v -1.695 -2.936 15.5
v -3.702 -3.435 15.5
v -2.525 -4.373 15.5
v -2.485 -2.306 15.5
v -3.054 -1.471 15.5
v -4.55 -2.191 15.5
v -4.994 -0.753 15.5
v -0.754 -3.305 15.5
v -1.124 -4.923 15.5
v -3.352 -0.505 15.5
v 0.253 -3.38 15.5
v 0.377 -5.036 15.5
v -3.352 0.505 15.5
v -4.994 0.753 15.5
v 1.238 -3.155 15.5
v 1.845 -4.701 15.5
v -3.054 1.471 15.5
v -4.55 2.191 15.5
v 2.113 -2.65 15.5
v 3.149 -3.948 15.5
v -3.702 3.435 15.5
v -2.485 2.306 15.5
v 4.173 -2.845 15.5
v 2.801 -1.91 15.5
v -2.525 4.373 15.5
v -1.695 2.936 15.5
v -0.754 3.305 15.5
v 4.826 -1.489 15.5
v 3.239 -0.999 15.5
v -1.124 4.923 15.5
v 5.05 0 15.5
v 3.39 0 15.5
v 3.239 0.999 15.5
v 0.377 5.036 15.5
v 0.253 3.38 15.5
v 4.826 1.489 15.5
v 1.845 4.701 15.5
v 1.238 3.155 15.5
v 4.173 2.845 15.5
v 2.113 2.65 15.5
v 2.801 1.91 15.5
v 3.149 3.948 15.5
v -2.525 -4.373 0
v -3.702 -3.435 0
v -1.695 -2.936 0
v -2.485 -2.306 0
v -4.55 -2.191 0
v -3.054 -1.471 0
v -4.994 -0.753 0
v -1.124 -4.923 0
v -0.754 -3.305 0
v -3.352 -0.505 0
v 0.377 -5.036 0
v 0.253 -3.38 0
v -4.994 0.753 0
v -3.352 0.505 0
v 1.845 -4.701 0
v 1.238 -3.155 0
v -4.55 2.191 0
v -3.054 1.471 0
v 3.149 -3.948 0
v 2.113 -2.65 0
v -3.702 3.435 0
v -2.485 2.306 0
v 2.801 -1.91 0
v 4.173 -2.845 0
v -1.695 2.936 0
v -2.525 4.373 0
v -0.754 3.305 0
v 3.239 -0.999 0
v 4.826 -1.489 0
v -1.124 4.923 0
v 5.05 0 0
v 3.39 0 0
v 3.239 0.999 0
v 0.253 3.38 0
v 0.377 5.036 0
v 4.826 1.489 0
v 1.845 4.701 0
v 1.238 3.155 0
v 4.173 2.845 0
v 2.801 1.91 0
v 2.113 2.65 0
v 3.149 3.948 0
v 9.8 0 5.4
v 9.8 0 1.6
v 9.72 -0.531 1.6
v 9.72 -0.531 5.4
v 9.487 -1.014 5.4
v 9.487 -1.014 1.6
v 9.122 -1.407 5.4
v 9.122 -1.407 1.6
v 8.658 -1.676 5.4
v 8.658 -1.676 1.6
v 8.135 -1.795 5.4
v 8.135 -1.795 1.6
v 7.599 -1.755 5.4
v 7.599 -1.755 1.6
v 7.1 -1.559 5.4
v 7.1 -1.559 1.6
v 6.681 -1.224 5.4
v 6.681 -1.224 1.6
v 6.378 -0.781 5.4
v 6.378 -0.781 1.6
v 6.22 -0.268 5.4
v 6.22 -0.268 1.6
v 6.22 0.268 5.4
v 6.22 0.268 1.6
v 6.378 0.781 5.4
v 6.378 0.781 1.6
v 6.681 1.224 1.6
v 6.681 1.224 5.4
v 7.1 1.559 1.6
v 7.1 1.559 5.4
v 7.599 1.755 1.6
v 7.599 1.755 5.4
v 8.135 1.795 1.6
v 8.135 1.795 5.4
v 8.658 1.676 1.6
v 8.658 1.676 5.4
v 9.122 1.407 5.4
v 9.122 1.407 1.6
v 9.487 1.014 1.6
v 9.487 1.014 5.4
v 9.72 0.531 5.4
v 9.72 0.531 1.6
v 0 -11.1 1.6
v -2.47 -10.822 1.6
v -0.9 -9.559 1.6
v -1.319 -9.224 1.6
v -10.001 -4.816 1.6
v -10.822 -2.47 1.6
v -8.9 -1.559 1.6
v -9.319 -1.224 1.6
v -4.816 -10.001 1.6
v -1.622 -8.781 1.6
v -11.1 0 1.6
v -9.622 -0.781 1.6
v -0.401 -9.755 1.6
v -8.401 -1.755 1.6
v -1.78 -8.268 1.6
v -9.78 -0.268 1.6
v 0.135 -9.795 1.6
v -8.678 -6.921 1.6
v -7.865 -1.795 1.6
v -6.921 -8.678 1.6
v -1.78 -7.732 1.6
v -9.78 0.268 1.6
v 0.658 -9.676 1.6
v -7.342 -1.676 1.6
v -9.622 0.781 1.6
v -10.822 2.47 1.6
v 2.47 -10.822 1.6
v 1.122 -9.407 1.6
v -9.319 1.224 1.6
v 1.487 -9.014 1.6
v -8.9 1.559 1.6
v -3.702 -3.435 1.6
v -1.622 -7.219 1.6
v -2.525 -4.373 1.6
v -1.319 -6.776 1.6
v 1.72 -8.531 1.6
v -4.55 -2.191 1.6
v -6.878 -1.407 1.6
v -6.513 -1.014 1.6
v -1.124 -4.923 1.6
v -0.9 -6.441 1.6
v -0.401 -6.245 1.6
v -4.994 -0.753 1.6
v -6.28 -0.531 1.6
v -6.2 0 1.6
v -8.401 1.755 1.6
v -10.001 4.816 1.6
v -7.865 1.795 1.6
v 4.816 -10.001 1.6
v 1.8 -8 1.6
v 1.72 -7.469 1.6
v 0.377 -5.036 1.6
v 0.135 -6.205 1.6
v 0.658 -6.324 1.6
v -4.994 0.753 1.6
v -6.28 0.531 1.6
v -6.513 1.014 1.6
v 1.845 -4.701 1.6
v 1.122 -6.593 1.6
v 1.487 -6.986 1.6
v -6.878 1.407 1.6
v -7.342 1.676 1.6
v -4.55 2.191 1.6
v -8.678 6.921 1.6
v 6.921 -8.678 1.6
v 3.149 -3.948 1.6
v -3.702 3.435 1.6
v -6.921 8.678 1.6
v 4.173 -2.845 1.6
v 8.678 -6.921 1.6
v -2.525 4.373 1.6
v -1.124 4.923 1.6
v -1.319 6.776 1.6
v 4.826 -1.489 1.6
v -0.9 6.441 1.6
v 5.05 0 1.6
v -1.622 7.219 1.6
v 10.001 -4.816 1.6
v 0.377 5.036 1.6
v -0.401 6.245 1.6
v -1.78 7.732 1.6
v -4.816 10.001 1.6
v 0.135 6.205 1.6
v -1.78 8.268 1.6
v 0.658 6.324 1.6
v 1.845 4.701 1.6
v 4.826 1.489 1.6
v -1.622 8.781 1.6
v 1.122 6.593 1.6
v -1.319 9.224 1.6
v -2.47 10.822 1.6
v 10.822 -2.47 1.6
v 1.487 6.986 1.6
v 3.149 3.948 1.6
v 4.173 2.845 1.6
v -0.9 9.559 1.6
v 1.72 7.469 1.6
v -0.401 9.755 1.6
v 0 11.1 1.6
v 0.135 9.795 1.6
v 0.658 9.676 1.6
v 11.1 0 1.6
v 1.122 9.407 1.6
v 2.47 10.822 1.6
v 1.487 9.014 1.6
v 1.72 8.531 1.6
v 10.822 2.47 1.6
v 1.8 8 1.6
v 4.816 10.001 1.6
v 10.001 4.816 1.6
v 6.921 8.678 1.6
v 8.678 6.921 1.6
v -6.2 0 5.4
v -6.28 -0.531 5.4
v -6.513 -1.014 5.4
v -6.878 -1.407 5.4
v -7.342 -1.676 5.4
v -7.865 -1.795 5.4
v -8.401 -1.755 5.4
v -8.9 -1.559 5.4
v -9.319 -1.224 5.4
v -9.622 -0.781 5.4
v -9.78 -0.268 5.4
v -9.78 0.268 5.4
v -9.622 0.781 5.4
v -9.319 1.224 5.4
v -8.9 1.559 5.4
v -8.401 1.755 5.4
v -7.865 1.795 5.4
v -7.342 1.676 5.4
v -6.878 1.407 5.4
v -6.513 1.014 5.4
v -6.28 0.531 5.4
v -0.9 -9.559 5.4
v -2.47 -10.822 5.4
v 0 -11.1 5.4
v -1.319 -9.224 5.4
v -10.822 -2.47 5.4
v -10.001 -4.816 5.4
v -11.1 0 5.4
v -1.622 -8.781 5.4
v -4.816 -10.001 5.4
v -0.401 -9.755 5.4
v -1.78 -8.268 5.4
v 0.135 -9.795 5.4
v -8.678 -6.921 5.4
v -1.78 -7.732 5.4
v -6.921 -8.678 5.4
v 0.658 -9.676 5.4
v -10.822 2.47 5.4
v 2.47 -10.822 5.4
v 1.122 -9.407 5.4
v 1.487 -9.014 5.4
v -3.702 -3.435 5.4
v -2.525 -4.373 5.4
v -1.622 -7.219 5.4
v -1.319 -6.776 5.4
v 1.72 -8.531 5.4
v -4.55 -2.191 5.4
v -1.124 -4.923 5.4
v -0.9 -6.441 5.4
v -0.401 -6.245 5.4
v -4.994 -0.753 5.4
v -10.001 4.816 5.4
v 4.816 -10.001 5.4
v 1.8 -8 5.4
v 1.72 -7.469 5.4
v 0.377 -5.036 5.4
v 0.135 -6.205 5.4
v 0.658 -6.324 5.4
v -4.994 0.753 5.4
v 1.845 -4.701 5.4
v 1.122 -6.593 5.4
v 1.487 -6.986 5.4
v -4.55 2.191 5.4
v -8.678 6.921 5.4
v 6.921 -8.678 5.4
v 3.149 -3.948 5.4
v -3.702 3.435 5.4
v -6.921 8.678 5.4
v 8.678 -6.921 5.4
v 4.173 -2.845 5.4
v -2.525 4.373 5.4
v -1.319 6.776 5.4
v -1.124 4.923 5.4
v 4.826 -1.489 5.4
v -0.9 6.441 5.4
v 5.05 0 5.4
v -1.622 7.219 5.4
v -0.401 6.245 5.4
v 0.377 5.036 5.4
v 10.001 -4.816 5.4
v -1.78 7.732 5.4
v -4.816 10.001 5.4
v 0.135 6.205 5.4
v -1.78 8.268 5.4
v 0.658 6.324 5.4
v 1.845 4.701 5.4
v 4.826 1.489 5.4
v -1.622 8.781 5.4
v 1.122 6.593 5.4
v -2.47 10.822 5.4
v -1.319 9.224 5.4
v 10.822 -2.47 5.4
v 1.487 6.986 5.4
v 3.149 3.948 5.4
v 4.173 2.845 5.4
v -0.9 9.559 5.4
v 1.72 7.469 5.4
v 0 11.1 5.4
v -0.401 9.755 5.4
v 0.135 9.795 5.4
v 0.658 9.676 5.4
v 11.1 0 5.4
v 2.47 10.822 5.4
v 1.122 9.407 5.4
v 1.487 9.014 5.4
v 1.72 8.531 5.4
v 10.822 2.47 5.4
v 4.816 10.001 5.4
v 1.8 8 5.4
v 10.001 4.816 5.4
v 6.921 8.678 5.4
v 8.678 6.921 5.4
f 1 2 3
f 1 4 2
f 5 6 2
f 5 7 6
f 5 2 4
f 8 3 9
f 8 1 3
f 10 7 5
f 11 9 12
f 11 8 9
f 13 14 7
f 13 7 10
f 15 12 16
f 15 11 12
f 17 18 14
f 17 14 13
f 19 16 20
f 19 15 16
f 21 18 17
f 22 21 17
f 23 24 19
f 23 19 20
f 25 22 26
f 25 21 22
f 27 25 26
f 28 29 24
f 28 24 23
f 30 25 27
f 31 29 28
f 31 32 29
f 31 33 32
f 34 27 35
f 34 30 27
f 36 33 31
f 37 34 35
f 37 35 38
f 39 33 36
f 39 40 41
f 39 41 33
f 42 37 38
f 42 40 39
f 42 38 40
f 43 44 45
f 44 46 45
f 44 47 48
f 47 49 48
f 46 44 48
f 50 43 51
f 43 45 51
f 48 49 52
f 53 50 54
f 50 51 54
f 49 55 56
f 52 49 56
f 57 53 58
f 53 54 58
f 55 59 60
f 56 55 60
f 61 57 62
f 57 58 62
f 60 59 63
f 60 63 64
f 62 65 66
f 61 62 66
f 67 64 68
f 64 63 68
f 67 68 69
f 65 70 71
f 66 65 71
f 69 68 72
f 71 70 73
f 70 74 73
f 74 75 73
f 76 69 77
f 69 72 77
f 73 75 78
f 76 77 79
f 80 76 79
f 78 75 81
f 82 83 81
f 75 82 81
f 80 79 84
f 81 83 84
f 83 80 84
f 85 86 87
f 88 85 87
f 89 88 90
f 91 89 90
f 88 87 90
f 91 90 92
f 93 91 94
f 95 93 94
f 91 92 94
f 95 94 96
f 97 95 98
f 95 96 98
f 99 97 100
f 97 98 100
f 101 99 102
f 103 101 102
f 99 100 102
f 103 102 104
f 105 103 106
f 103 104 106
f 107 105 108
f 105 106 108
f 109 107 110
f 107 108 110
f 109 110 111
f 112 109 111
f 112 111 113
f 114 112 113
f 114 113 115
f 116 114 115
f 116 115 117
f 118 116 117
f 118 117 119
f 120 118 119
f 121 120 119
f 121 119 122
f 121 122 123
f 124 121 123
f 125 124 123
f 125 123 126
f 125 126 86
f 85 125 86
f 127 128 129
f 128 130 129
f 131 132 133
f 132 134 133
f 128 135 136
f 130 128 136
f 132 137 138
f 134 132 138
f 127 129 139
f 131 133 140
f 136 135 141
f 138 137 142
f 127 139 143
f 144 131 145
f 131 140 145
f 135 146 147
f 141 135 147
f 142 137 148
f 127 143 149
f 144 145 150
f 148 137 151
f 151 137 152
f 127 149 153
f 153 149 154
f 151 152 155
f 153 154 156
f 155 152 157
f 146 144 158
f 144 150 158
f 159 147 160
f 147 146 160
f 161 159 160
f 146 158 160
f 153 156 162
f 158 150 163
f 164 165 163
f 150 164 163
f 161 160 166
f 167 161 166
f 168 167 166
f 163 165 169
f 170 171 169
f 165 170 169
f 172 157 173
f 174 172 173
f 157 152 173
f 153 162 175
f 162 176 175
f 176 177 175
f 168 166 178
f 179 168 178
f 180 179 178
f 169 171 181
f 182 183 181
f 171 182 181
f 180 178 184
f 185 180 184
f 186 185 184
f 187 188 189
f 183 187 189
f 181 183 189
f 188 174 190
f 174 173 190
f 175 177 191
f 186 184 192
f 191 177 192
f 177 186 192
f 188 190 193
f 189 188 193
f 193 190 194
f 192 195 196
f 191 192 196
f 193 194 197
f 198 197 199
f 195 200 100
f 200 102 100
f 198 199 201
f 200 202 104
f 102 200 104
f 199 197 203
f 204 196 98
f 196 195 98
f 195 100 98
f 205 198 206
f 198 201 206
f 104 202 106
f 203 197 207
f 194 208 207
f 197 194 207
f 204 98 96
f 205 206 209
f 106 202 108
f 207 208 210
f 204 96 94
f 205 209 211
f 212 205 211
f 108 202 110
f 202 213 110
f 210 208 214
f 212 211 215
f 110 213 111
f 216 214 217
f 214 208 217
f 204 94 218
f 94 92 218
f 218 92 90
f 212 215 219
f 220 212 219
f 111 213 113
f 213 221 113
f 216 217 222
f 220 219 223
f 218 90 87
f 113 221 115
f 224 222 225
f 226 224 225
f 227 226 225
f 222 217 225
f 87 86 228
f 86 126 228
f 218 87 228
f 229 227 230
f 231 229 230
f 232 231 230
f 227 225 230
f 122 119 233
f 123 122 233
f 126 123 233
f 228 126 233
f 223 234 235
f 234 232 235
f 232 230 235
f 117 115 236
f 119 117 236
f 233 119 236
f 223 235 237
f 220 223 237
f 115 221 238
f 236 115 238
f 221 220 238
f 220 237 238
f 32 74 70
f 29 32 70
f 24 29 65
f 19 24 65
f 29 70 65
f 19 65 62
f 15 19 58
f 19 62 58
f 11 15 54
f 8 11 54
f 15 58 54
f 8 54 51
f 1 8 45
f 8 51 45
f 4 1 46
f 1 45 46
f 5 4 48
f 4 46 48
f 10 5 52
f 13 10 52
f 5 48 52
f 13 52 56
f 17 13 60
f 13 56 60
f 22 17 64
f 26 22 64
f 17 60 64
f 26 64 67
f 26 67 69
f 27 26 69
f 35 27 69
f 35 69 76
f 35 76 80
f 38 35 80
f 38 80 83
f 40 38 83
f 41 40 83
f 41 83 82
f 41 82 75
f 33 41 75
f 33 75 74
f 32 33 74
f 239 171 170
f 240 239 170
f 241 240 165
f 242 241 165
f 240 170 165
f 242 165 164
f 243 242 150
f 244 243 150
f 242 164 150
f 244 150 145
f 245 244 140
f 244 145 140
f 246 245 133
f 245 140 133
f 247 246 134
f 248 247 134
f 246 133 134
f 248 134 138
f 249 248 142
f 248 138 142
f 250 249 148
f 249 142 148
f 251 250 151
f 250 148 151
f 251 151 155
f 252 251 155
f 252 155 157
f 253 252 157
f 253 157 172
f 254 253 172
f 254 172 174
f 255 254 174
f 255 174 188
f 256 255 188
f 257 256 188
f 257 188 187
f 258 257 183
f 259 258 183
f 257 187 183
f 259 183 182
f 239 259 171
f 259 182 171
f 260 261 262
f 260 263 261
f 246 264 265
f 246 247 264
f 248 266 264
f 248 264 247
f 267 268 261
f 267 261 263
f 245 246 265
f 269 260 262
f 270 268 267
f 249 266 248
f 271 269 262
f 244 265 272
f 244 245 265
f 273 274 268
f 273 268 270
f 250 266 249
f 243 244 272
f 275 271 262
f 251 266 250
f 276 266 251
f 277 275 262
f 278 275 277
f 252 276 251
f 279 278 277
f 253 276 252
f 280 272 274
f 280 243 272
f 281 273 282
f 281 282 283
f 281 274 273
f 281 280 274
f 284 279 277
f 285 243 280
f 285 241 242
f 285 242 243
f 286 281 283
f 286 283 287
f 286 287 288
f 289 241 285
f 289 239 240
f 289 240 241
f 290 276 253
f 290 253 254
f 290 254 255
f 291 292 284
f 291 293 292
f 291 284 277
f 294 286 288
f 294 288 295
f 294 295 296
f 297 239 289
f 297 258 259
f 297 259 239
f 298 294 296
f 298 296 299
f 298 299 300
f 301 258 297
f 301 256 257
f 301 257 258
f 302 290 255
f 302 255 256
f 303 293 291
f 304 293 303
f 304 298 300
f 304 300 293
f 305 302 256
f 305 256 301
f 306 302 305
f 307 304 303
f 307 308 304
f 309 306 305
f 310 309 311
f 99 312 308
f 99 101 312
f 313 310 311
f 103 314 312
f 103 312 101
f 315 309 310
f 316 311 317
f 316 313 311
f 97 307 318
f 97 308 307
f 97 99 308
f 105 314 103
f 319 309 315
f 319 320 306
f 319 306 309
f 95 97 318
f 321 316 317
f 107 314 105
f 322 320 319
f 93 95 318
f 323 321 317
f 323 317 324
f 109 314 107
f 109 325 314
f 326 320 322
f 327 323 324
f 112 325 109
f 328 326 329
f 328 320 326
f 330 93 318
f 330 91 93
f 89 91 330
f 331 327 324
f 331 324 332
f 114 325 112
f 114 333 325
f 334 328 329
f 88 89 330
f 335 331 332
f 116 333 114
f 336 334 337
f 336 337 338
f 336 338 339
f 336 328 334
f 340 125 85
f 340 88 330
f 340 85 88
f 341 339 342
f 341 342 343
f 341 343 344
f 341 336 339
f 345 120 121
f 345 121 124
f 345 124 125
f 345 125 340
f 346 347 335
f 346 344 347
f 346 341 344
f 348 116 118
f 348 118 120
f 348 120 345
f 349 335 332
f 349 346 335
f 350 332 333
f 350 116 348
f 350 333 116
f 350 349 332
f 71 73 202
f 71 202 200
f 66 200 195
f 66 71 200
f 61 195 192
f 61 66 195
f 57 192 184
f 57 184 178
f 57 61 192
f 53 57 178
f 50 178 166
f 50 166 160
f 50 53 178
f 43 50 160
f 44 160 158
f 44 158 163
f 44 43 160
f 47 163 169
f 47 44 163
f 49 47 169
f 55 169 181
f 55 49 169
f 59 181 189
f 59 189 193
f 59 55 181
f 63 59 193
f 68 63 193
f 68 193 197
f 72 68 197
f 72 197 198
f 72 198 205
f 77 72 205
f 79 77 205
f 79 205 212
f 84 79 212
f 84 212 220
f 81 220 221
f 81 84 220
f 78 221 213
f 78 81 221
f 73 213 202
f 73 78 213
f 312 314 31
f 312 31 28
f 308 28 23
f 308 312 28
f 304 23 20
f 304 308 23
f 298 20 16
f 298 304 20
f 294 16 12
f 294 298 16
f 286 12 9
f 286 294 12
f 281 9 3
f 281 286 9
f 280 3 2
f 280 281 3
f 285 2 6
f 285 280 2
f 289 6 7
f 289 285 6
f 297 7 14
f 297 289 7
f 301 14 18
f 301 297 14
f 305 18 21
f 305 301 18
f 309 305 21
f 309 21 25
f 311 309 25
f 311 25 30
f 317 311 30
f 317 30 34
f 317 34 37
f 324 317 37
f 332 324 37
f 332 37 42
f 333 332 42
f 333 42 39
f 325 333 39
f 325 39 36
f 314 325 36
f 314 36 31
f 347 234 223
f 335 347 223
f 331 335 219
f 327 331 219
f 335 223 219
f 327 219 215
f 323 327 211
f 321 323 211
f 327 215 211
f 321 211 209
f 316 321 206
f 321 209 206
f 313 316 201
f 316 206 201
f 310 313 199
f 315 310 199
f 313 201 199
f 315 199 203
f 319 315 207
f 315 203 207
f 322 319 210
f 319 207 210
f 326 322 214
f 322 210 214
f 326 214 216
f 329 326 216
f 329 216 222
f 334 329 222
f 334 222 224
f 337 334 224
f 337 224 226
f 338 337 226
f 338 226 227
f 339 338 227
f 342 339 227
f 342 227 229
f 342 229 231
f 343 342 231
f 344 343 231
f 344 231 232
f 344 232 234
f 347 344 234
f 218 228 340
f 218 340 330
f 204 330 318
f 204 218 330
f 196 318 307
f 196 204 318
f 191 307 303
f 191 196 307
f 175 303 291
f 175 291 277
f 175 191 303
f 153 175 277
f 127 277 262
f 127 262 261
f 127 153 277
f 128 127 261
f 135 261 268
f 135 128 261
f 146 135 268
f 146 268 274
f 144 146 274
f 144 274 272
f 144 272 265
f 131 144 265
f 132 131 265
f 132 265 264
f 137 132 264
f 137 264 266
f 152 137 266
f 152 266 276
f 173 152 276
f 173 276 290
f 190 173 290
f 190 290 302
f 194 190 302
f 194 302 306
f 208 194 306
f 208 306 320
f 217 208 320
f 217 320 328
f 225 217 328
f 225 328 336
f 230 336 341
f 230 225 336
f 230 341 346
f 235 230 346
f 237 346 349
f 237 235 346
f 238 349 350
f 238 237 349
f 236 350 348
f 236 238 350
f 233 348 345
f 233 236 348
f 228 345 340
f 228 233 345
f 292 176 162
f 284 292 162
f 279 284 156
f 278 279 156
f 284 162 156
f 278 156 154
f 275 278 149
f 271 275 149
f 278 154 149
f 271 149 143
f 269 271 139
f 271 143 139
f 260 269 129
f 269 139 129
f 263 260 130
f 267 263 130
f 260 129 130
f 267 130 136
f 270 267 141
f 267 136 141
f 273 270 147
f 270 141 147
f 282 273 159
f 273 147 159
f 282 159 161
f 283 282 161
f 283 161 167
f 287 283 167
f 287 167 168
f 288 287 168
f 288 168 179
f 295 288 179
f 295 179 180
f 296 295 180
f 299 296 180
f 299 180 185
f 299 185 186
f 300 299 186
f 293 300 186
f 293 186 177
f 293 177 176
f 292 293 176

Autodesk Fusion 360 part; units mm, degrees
sketch "Sketch2" plane through (0, 0, 0) normal (0, 0, 1) x (1, 0, 0)
  circle A0 centre (0, 0) radius 5.05
  circle A1 centre (0, 0) radius 11.1
  line L0 (-35, 0) -> (41.5964, 0) construction
  line L1 (0, 35) -> (0, -35) construction
  circle A2 centre (0, 8) radius 1.8
  circle A3 centre (8, 0) radius 1.8
  circle A4 centre (0, -8) radius 1.8
  circle A5 centre (-8, 0) radius 1.8
  circle A6 centre (0, 0) radius 8 construction
  circle A7 centre (0, 0) radius 4
  dimension "d1" = 10.1
  dimension "d2" = 22.2
  dimension "d3" = 3.6
  dimension "d4" = 3.6
  dimension "d5" = 3.6
  dimension "d6" = 3.6
  dimension "d7" = 16
  dimension "d13" = 8
extrude "Extrude1" add sketch "Sketch2" along normal blind 15.5 contours A0 | A7
extrude "Extrude2" add sketch "Sketch2" along normal blind 3.8 from surface at 1.6 contours A1
extrude "Extrude3" cut sketch "Sketch2" along normal up to surface (15.5 mm away) contours A7
thread "Thread1" "ISO Metric profile 8.0 M8x1.25 6H" major diameter 8.17 minor diameter 6.7795 pitch 1.25 angle 60 resizes the face on face at (3.995, -0.1994, 10.3333)
